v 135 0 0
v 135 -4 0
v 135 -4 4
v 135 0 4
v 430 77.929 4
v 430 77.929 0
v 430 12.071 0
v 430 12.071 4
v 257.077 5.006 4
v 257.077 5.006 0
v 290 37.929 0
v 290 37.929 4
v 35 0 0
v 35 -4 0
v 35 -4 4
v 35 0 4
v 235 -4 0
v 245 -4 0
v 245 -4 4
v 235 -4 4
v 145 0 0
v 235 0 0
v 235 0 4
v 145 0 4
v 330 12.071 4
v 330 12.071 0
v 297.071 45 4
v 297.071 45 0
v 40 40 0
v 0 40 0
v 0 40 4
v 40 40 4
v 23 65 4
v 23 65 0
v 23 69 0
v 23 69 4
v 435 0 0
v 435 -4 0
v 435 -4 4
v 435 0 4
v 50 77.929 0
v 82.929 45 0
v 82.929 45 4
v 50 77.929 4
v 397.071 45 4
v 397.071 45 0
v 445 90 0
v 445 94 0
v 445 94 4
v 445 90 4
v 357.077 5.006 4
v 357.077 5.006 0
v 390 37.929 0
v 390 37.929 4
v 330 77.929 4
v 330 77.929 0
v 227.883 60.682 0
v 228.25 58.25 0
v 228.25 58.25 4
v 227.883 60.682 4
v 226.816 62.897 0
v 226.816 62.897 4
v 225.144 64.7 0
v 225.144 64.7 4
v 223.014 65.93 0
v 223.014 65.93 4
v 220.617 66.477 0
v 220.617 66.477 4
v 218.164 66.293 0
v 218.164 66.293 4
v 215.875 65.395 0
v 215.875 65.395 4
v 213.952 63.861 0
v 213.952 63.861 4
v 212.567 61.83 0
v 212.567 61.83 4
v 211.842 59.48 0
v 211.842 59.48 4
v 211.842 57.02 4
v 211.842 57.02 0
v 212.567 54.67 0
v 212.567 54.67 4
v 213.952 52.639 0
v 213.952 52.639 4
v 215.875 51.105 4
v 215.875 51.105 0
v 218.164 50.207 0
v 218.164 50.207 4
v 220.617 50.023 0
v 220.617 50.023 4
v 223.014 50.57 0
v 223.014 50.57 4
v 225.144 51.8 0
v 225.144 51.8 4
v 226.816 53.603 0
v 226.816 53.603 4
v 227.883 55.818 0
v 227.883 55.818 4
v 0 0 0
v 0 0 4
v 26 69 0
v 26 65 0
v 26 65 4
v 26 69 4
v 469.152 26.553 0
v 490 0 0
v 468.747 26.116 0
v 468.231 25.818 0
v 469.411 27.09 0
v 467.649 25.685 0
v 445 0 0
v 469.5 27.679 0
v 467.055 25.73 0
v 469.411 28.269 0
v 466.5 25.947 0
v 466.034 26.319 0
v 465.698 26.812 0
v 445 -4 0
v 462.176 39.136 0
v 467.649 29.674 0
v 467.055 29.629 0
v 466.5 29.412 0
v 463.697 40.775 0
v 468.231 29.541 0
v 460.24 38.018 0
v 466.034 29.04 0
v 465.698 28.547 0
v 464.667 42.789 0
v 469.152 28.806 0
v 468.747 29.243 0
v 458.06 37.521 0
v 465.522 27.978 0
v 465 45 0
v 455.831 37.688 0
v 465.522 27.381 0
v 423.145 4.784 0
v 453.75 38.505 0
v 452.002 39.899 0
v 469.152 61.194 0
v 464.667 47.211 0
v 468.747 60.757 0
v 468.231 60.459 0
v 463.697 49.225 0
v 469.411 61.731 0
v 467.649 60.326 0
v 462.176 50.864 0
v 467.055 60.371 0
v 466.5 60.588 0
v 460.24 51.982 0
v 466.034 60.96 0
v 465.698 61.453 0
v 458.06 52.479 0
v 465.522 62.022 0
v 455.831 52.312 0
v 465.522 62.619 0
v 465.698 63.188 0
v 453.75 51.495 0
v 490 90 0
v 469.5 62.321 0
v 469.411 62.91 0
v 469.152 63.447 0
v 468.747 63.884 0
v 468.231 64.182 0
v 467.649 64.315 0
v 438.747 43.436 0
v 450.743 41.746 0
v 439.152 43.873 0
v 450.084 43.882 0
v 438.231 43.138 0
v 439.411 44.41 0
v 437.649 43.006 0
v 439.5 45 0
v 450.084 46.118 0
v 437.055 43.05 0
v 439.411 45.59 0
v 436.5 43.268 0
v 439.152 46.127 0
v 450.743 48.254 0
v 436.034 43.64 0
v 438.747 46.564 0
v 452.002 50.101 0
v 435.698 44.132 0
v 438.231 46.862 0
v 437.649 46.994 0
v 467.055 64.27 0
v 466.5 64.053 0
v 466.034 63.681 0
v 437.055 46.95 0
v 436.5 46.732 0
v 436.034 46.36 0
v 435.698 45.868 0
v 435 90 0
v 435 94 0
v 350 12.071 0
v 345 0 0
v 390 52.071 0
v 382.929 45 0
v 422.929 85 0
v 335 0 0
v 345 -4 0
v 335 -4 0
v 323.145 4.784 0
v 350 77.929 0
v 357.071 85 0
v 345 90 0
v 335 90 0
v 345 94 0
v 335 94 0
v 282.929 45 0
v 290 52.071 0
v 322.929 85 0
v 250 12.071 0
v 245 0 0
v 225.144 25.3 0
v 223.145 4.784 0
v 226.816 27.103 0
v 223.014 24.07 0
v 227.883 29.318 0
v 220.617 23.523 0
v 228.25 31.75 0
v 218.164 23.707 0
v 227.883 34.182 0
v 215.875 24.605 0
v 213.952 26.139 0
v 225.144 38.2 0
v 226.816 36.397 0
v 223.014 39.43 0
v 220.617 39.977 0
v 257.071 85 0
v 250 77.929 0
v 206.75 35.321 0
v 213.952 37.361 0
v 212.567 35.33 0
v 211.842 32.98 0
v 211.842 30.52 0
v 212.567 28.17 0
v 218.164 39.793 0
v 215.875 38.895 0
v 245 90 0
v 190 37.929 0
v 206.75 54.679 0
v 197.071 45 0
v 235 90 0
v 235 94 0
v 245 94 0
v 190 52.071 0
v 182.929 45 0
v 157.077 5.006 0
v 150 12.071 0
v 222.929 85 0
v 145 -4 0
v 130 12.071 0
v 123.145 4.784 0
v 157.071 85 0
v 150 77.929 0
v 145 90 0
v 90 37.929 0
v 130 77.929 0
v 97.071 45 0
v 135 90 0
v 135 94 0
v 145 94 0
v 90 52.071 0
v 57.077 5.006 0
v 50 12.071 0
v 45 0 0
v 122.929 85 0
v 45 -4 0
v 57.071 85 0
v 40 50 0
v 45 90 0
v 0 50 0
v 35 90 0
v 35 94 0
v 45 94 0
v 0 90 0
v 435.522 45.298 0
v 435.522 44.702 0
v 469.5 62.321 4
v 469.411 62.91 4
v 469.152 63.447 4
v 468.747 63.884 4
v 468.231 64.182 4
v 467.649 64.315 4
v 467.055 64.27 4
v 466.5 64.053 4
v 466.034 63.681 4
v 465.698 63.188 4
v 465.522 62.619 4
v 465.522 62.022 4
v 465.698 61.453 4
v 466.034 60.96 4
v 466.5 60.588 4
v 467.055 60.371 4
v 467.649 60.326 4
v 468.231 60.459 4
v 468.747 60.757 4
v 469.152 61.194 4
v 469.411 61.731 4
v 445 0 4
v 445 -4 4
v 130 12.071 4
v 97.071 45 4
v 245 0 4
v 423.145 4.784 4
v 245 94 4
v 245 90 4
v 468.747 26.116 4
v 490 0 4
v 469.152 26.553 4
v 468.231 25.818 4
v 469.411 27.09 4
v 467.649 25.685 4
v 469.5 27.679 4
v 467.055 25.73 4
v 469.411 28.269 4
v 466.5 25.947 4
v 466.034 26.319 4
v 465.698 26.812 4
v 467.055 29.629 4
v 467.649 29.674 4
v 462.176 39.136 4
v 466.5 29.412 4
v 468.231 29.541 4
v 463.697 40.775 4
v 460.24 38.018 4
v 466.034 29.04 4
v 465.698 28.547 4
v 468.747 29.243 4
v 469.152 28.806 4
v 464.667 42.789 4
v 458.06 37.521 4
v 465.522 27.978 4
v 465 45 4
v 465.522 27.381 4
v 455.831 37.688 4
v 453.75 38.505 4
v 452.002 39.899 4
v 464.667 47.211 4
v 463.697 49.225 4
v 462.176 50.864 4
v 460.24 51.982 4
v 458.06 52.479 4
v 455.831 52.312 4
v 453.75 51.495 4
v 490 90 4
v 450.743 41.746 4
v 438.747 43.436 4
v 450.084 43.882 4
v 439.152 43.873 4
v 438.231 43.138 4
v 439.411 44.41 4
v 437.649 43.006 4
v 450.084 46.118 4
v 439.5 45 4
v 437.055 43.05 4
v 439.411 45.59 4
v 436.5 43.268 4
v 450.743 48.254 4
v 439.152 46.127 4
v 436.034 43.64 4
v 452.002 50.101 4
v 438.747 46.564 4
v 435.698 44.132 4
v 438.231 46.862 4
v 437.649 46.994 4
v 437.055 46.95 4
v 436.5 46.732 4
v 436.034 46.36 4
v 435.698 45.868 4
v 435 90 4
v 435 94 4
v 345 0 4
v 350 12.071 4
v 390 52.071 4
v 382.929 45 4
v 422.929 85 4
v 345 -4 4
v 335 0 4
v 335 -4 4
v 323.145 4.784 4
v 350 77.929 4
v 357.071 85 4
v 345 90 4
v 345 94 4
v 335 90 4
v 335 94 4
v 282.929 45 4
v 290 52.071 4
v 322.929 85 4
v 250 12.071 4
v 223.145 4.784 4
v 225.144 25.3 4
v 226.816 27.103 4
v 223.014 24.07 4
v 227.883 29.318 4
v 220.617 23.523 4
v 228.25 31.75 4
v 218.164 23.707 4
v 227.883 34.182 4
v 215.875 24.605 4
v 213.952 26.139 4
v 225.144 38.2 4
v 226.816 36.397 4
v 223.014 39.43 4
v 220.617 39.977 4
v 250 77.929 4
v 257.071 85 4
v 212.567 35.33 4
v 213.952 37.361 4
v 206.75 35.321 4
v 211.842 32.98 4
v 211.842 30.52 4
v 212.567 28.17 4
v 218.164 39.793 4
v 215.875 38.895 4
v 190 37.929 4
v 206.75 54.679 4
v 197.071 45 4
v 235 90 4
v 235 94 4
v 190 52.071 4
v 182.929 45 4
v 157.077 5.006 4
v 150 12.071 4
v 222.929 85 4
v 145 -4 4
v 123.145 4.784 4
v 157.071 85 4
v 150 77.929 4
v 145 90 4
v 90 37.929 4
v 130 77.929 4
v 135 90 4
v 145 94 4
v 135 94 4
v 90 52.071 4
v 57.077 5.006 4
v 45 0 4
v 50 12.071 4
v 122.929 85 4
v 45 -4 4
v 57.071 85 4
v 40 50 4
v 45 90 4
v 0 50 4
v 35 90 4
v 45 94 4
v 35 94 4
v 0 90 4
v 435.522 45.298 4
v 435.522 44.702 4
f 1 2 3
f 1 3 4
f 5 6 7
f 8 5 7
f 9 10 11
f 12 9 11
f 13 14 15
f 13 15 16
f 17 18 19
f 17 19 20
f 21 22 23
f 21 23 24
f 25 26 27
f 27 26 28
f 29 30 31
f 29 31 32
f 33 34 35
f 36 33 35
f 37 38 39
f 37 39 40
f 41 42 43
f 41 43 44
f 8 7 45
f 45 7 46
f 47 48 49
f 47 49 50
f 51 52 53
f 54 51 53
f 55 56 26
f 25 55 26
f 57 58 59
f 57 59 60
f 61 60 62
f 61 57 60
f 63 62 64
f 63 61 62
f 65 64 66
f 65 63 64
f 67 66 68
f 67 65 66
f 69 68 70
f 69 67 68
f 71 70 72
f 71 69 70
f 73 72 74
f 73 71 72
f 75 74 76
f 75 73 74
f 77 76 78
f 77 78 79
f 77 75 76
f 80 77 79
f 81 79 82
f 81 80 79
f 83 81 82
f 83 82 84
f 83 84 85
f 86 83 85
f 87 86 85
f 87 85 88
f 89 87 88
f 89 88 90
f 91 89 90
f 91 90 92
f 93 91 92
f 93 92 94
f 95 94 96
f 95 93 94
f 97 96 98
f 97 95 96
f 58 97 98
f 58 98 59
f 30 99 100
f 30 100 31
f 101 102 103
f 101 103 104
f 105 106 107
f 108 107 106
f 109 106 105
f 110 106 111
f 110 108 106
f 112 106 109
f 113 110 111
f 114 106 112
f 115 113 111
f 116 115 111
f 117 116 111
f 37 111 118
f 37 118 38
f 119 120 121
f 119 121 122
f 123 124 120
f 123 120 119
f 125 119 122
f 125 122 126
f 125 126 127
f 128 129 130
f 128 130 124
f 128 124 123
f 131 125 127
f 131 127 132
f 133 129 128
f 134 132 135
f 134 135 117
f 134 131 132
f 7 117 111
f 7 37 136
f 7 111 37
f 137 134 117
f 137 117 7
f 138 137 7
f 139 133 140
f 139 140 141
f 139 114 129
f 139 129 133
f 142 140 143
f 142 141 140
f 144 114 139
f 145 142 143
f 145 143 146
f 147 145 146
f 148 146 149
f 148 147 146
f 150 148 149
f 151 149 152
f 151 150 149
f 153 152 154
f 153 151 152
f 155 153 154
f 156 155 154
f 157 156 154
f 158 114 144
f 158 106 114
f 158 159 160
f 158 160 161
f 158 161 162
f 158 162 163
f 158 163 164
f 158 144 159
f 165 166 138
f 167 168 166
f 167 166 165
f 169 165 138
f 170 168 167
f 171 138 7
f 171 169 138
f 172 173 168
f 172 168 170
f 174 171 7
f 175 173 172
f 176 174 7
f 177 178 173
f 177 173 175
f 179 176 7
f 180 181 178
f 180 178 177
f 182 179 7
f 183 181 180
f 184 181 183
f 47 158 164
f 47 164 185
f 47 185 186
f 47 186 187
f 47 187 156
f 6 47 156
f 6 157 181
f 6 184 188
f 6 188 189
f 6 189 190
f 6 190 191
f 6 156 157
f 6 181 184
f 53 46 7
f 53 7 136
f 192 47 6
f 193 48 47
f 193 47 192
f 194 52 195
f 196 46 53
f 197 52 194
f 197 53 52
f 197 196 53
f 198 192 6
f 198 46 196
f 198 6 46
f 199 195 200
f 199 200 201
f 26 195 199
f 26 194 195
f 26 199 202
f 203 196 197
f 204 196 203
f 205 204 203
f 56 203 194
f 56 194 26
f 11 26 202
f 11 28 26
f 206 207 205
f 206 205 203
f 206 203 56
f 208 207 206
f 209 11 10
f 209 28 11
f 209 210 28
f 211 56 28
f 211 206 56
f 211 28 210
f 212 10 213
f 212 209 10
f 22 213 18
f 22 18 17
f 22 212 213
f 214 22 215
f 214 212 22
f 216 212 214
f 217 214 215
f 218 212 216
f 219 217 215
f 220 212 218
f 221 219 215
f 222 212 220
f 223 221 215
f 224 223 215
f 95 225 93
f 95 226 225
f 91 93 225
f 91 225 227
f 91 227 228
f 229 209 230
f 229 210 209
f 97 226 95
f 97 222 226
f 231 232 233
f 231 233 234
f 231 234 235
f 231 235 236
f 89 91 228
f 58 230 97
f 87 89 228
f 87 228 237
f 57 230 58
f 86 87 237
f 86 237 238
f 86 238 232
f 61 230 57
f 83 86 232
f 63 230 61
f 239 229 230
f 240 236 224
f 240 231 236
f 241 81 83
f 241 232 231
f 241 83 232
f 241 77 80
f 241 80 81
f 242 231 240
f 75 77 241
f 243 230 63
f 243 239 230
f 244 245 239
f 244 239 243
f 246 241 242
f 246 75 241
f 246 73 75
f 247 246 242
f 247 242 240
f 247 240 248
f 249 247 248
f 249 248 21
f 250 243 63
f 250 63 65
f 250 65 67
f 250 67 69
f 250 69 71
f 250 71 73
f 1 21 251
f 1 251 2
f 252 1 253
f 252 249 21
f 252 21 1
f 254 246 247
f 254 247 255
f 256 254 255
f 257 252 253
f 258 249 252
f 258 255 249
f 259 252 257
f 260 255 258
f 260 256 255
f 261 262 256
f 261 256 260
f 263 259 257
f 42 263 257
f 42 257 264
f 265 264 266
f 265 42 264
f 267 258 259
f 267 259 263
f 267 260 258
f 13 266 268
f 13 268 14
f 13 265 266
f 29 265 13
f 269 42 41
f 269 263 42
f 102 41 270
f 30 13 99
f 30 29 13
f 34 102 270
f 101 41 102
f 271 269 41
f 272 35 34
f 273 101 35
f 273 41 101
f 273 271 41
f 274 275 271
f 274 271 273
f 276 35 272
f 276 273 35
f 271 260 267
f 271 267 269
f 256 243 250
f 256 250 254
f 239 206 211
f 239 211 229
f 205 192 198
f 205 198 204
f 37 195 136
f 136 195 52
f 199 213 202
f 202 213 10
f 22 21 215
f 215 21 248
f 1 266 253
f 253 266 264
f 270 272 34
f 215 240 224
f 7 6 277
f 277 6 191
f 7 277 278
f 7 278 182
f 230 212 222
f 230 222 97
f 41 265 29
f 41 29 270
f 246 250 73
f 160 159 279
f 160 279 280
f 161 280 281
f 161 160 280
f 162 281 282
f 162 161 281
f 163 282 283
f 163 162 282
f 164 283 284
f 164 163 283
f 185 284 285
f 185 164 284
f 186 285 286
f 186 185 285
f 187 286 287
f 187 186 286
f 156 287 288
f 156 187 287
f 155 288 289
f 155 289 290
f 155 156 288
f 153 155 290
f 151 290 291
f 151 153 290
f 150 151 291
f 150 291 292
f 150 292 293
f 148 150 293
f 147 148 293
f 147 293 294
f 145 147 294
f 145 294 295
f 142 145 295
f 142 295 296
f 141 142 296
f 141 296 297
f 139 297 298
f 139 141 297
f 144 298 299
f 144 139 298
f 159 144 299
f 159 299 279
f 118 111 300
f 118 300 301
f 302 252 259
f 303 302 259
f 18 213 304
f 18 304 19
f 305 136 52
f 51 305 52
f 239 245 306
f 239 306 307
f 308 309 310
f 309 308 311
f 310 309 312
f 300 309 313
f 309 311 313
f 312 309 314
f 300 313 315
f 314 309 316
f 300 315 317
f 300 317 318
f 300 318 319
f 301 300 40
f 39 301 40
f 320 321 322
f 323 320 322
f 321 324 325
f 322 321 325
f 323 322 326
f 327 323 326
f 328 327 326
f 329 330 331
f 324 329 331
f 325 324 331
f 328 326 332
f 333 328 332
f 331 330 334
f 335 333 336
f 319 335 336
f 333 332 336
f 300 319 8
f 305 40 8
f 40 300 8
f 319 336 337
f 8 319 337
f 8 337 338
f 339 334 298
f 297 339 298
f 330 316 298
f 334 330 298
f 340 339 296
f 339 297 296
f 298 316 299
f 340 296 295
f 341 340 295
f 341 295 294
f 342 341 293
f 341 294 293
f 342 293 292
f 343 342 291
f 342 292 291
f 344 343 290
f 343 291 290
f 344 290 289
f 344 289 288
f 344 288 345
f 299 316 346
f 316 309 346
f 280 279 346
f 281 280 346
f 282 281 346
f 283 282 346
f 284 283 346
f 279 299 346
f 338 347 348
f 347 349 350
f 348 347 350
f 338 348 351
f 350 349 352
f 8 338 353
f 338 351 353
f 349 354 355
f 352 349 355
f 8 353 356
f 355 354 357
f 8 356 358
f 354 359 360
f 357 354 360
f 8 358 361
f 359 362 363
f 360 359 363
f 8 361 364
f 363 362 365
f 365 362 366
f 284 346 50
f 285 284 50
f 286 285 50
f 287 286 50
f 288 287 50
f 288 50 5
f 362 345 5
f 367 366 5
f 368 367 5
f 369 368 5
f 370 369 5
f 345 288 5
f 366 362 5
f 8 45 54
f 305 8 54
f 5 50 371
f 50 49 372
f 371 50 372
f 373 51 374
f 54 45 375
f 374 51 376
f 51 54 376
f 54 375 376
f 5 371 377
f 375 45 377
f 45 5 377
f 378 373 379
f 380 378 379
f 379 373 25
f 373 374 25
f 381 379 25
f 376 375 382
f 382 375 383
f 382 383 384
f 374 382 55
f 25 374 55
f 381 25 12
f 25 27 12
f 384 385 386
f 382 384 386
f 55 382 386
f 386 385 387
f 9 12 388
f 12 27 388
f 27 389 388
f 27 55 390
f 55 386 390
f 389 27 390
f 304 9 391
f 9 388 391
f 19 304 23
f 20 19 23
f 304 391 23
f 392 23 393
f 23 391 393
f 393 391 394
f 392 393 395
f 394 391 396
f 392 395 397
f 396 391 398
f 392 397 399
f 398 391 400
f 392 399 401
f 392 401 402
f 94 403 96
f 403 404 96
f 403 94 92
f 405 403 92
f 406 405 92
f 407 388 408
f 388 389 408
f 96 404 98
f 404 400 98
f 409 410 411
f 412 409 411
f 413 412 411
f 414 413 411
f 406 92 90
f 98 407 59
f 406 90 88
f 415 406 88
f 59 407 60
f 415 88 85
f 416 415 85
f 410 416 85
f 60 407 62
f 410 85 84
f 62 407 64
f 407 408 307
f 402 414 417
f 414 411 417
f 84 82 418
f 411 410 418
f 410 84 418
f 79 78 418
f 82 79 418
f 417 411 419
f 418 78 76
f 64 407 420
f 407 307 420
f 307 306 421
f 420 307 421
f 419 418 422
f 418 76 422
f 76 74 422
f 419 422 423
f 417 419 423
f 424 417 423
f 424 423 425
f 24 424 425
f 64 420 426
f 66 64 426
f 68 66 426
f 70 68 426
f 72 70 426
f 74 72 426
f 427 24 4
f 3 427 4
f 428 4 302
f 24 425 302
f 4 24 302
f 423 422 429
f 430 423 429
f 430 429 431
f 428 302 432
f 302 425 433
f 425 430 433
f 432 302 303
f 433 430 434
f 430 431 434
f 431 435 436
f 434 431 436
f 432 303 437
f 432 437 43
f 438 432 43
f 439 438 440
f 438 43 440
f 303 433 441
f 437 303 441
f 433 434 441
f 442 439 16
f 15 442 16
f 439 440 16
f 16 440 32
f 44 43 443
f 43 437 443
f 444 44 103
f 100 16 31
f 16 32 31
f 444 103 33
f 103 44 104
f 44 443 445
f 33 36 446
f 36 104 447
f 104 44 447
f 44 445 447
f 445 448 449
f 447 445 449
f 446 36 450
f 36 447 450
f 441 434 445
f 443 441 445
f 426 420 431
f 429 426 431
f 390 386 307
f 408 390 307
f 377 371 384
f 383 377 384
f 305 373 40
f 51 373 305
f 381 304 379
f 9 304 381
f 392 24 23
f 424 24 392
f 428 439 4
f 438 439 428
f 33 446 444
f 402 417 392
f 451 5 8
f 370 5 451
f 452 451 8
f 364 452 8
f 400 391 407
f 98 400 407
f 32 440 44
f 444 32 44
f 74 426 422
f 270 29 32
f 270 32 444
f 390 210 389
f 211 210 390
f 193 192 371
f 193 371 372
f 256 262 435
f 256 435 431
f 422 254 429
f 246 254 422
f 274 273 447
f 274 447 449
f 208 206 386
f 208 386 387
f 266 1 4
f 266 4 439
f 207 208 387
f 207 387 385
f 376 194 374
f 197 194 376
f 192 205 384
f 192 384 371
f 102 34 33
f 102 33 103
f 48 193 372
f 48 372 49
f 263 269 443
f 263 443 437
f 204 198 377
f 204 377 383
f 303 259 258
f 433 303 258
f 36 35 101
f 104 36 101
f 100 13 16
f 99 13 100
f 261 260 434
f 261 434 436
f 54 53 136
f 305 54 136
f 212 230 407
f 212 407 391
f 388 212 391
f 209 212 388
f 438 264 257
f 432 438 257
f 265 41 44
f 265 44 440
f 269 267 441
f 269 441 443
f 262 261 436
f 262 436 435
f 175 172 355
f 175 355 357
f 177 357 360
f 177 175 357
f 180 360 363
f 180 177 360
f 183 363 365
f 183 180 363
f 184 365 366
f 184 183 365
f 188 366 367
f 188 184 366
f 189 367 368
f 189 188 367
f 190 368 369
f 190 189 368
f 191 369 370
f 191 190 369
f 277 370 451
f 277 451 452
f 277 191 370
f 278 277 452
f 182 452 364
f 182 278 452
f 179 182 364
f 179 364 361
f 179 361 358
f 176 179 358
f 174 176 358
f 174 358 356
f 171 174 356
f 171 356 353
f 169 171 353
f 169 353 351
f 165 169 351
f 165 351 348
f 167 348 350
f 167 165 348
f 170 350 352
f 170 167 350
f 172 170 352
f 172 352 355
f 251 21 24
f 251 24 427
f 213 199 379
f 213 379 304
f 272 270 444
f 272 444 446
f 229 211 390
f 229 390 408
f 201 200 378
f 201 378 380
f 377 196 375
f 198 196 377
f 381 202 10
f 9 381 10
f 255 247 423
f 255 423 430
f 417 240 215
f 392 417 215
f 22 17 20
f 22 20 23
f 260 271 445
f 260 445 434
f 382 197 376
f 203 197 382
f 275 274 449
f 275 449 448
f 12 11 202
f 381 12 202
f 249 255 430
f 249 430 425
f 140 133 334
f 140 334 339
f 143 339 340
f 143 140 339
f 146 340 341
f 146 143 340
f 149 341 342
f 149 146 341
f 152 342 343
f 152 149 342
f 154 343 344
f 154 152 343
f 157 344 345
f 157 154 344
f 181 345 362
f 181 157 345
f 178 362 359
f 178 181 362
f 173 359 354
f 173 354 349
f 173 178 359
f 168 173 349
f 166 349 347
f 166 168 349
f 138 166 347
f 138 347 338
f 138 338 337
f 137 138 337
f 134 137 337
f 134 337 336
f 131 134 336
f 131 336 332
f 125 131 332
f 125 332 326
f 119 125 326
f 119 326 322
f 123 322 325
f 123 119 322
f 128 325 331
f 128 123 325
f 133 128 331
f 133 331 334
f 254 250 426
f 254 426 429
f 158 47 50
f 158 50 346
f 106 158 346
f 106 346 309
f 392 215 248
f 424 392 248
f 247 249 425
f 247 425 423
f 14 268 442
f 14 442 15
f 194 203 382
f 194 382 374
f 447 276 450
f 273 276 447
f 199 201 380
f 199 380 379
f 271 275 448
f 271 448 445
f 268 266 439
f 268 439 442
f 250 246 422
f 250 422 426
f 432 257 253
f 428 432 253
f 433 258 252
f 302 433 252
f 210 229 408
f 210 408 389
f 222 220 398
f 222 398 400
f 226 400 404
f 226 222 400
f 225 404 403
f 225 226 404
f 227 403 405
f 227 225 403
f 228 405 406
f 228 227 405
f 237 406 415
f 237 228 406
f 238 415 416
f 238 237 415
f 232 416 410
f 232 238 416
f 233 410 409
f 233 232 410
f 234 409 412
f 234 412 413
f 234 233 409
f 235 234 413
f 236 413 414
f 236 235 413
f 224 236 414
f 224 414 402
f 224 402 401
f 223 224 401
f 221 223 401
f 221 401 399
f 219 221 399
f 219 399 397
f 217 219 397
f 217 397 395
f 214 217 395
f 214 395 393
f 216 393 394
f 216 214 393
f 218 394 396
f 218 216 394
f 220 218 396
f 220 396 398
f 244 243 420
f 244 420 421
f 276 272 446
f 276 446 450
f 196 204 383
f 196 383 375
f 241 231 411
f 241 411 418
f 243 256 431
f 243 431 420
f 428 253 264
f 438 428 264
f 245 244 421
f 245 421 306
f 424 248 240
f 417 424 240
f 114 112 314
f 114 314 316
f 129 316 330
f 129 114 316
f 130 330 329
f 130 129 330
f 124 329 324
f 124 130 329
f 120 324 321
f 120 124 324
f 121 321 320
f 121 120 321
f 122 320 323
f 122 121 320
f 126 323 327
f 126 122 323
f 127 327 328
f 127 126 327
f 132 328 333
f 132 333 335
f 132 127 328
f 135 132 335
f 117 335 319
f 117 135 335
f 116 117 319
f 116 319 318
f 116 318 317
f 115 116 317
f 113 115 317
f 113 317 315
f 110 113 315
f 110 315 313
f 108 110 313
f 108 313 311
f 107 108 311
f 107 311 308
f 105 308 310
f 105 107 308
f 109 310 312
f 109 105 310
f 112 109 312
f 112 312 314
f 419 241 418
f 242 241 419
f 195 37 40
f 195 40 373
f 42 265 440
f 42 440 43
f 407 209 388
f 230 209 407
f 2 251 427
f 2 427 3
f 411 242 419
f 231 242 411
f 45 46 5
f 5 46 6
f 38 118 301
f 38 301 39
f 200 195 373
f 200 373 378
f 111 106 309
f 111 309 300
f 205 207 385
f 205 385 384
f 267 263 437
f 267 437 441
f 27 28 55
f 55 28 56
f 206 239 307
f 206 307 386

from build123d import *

# Parameters (mm, degrees)
SCHIZZO1_R                   = 7.5
SCHIZZO1_R_2                 = 2
SCHIZZO1_R_3                 = 8.25
SCHIZZO1_W                   = 3
SCHIZZO1_H                   = 4
ESTRUSIONE_ESTRUSIONE1_DEPTH = 4


with BuildPart() as part:
    # Schizzo1 → Estrusione-Estrusione1 (new body)
    with BuildSketch(Plane.XY):
        Polygon((0, 50), (0, 90), (35, 90), (35, 94), (45, 94), (45, 90), (135, 90), (135, 94), (145, 94), (145, 90), (235, 90), (235, 94), (245, 94), (245, 90), (335, 90), (335, 94), (345, 94), (345, 90), (435, 90), (435, 94), (445, 94), (445, 90), (490, 90), (490, 0), (445, 0), (445, -4), (435, -4), (435, 0), (345, 0), (345, -4), (335, -4), (335, 0), (245, 0), (245, -4), (235, -4), (235, 0), (145, 0), (145, -4), (135, -4), (135, 0), (45, 0), (45, -4), (35, -4), (35, 0), (0, 0), (0, 40), (40, 40), (40, 50), align=None)
        with Locations((457.5, 45)):
            Circle(SCHIZZO1_R, mode=Mode.SUBTRACT)
        with Locations((437.5, 45)):
            Circle(SCHIZZO1_R_2, mode=Mode.SUBTRACT)
        with Locations((467.5, 27.679491924)):
            Circle(SCHIZZO1_R_2, mode=Mode.SUBTRACT)
        with Locations((467.5, 62.320508076)):
            Circle(SCHIZZO1_R_2, mode=Mode.SUBTRACT)
        with Locations((220, 58.25)):
            Circle(SCHIZZO1_R_3, mode=Mode.SUBTRACT)
        with Locations((220, 31.75)):
            Circle(SCHIZZO1_R_3, mode=Mode.SUBTRACT)
        Polygon((50, 77.928932188), (50, 12.071067812), (82.928932188, 45), align=None, mode=Mode.SUBTRACT)
        Polygon((130, 77.928932188), (130, 12.071067812), (97.071067812, 45), align=None, mode=Mode.SUBTRACT)
        Polygon((57.071067812, 85), (90, 52.071067812), (122.928932188, 85), align=None, mode=Mode.SUBTRACT)
        Polygon((123.1448388, 4.784093388), (57.077189669, 5.006121857), (90, 37.928932188), align=None, mode=Mode.SUBTRACT)
        Polygon((150, 77.928932188), (150, 12.071067812), (182.928932188, 45), align=None, mode=Mode.SUBTRACT)
        Polygon((157.071067812, 85), (190, 52.071067812), (222.928932188, 85), align=None, mode=Mode.SUBTRACT)
        Polygon((223.1448388, 4.784093388), (157.077189669, 5.006121857), (190, 37.928932188), align=None, mode=Mode.SUBTRACT)
        Polygon((250, 77.928932188), (250, 12.071067812), (282.928932188, 45), align=None, mode=Mode.SUBTRACT)
        Polygon((330, 77.928932188), (330, 12.071067812), (297.071067812, 45), align=None, mode=Mode.SUBTRACT)
        Polygon((257.071067812, 85), (290, 52.071067812), (322.928932188, 85), align=None, mode=Mode.SUBTRACT)
        Polygon((323.1448388, 4.784093388), (257.077189669, 5.006121857), (290, 37.928932188), align=None, mode=Mode.SUBTRACT)
        Polygon((350, 77.928932188), (350, 12.071067812), (382.928932188, 45), align=None, mode=Mode.SUBTRACT)
        Polygon((430, 77.928932188), (430, 12.071067812), (397.071067812, 45), align=None, mode=Mode.SUBTRACT)
        Polygon((357.071067812, 85), (390, 52.071067812), (422.928932188, 85), align=None, mode=Mode.SUBTRACT)
        Polygon((423.1448388, 4.784093388), (357.077189669, 5.006121857), (390, 37.928932188), align=None, mode=Mode.SUBTRACT)
        with Locations((24.5, 67)):
            Rectangle(SCHIZZO1_W, SCHIZZO1_H, mode=Mode.SUBTRACT)
        Polygon((206.75, 54.678932188), (197.071067812, 45), (206.75, 35.321067812), align=None, mode=Mode.SUBTRACT)
    extrude(amount=ESTRUSIONE_ESTRUSIONE1_DEPTH)


solid = part.part
